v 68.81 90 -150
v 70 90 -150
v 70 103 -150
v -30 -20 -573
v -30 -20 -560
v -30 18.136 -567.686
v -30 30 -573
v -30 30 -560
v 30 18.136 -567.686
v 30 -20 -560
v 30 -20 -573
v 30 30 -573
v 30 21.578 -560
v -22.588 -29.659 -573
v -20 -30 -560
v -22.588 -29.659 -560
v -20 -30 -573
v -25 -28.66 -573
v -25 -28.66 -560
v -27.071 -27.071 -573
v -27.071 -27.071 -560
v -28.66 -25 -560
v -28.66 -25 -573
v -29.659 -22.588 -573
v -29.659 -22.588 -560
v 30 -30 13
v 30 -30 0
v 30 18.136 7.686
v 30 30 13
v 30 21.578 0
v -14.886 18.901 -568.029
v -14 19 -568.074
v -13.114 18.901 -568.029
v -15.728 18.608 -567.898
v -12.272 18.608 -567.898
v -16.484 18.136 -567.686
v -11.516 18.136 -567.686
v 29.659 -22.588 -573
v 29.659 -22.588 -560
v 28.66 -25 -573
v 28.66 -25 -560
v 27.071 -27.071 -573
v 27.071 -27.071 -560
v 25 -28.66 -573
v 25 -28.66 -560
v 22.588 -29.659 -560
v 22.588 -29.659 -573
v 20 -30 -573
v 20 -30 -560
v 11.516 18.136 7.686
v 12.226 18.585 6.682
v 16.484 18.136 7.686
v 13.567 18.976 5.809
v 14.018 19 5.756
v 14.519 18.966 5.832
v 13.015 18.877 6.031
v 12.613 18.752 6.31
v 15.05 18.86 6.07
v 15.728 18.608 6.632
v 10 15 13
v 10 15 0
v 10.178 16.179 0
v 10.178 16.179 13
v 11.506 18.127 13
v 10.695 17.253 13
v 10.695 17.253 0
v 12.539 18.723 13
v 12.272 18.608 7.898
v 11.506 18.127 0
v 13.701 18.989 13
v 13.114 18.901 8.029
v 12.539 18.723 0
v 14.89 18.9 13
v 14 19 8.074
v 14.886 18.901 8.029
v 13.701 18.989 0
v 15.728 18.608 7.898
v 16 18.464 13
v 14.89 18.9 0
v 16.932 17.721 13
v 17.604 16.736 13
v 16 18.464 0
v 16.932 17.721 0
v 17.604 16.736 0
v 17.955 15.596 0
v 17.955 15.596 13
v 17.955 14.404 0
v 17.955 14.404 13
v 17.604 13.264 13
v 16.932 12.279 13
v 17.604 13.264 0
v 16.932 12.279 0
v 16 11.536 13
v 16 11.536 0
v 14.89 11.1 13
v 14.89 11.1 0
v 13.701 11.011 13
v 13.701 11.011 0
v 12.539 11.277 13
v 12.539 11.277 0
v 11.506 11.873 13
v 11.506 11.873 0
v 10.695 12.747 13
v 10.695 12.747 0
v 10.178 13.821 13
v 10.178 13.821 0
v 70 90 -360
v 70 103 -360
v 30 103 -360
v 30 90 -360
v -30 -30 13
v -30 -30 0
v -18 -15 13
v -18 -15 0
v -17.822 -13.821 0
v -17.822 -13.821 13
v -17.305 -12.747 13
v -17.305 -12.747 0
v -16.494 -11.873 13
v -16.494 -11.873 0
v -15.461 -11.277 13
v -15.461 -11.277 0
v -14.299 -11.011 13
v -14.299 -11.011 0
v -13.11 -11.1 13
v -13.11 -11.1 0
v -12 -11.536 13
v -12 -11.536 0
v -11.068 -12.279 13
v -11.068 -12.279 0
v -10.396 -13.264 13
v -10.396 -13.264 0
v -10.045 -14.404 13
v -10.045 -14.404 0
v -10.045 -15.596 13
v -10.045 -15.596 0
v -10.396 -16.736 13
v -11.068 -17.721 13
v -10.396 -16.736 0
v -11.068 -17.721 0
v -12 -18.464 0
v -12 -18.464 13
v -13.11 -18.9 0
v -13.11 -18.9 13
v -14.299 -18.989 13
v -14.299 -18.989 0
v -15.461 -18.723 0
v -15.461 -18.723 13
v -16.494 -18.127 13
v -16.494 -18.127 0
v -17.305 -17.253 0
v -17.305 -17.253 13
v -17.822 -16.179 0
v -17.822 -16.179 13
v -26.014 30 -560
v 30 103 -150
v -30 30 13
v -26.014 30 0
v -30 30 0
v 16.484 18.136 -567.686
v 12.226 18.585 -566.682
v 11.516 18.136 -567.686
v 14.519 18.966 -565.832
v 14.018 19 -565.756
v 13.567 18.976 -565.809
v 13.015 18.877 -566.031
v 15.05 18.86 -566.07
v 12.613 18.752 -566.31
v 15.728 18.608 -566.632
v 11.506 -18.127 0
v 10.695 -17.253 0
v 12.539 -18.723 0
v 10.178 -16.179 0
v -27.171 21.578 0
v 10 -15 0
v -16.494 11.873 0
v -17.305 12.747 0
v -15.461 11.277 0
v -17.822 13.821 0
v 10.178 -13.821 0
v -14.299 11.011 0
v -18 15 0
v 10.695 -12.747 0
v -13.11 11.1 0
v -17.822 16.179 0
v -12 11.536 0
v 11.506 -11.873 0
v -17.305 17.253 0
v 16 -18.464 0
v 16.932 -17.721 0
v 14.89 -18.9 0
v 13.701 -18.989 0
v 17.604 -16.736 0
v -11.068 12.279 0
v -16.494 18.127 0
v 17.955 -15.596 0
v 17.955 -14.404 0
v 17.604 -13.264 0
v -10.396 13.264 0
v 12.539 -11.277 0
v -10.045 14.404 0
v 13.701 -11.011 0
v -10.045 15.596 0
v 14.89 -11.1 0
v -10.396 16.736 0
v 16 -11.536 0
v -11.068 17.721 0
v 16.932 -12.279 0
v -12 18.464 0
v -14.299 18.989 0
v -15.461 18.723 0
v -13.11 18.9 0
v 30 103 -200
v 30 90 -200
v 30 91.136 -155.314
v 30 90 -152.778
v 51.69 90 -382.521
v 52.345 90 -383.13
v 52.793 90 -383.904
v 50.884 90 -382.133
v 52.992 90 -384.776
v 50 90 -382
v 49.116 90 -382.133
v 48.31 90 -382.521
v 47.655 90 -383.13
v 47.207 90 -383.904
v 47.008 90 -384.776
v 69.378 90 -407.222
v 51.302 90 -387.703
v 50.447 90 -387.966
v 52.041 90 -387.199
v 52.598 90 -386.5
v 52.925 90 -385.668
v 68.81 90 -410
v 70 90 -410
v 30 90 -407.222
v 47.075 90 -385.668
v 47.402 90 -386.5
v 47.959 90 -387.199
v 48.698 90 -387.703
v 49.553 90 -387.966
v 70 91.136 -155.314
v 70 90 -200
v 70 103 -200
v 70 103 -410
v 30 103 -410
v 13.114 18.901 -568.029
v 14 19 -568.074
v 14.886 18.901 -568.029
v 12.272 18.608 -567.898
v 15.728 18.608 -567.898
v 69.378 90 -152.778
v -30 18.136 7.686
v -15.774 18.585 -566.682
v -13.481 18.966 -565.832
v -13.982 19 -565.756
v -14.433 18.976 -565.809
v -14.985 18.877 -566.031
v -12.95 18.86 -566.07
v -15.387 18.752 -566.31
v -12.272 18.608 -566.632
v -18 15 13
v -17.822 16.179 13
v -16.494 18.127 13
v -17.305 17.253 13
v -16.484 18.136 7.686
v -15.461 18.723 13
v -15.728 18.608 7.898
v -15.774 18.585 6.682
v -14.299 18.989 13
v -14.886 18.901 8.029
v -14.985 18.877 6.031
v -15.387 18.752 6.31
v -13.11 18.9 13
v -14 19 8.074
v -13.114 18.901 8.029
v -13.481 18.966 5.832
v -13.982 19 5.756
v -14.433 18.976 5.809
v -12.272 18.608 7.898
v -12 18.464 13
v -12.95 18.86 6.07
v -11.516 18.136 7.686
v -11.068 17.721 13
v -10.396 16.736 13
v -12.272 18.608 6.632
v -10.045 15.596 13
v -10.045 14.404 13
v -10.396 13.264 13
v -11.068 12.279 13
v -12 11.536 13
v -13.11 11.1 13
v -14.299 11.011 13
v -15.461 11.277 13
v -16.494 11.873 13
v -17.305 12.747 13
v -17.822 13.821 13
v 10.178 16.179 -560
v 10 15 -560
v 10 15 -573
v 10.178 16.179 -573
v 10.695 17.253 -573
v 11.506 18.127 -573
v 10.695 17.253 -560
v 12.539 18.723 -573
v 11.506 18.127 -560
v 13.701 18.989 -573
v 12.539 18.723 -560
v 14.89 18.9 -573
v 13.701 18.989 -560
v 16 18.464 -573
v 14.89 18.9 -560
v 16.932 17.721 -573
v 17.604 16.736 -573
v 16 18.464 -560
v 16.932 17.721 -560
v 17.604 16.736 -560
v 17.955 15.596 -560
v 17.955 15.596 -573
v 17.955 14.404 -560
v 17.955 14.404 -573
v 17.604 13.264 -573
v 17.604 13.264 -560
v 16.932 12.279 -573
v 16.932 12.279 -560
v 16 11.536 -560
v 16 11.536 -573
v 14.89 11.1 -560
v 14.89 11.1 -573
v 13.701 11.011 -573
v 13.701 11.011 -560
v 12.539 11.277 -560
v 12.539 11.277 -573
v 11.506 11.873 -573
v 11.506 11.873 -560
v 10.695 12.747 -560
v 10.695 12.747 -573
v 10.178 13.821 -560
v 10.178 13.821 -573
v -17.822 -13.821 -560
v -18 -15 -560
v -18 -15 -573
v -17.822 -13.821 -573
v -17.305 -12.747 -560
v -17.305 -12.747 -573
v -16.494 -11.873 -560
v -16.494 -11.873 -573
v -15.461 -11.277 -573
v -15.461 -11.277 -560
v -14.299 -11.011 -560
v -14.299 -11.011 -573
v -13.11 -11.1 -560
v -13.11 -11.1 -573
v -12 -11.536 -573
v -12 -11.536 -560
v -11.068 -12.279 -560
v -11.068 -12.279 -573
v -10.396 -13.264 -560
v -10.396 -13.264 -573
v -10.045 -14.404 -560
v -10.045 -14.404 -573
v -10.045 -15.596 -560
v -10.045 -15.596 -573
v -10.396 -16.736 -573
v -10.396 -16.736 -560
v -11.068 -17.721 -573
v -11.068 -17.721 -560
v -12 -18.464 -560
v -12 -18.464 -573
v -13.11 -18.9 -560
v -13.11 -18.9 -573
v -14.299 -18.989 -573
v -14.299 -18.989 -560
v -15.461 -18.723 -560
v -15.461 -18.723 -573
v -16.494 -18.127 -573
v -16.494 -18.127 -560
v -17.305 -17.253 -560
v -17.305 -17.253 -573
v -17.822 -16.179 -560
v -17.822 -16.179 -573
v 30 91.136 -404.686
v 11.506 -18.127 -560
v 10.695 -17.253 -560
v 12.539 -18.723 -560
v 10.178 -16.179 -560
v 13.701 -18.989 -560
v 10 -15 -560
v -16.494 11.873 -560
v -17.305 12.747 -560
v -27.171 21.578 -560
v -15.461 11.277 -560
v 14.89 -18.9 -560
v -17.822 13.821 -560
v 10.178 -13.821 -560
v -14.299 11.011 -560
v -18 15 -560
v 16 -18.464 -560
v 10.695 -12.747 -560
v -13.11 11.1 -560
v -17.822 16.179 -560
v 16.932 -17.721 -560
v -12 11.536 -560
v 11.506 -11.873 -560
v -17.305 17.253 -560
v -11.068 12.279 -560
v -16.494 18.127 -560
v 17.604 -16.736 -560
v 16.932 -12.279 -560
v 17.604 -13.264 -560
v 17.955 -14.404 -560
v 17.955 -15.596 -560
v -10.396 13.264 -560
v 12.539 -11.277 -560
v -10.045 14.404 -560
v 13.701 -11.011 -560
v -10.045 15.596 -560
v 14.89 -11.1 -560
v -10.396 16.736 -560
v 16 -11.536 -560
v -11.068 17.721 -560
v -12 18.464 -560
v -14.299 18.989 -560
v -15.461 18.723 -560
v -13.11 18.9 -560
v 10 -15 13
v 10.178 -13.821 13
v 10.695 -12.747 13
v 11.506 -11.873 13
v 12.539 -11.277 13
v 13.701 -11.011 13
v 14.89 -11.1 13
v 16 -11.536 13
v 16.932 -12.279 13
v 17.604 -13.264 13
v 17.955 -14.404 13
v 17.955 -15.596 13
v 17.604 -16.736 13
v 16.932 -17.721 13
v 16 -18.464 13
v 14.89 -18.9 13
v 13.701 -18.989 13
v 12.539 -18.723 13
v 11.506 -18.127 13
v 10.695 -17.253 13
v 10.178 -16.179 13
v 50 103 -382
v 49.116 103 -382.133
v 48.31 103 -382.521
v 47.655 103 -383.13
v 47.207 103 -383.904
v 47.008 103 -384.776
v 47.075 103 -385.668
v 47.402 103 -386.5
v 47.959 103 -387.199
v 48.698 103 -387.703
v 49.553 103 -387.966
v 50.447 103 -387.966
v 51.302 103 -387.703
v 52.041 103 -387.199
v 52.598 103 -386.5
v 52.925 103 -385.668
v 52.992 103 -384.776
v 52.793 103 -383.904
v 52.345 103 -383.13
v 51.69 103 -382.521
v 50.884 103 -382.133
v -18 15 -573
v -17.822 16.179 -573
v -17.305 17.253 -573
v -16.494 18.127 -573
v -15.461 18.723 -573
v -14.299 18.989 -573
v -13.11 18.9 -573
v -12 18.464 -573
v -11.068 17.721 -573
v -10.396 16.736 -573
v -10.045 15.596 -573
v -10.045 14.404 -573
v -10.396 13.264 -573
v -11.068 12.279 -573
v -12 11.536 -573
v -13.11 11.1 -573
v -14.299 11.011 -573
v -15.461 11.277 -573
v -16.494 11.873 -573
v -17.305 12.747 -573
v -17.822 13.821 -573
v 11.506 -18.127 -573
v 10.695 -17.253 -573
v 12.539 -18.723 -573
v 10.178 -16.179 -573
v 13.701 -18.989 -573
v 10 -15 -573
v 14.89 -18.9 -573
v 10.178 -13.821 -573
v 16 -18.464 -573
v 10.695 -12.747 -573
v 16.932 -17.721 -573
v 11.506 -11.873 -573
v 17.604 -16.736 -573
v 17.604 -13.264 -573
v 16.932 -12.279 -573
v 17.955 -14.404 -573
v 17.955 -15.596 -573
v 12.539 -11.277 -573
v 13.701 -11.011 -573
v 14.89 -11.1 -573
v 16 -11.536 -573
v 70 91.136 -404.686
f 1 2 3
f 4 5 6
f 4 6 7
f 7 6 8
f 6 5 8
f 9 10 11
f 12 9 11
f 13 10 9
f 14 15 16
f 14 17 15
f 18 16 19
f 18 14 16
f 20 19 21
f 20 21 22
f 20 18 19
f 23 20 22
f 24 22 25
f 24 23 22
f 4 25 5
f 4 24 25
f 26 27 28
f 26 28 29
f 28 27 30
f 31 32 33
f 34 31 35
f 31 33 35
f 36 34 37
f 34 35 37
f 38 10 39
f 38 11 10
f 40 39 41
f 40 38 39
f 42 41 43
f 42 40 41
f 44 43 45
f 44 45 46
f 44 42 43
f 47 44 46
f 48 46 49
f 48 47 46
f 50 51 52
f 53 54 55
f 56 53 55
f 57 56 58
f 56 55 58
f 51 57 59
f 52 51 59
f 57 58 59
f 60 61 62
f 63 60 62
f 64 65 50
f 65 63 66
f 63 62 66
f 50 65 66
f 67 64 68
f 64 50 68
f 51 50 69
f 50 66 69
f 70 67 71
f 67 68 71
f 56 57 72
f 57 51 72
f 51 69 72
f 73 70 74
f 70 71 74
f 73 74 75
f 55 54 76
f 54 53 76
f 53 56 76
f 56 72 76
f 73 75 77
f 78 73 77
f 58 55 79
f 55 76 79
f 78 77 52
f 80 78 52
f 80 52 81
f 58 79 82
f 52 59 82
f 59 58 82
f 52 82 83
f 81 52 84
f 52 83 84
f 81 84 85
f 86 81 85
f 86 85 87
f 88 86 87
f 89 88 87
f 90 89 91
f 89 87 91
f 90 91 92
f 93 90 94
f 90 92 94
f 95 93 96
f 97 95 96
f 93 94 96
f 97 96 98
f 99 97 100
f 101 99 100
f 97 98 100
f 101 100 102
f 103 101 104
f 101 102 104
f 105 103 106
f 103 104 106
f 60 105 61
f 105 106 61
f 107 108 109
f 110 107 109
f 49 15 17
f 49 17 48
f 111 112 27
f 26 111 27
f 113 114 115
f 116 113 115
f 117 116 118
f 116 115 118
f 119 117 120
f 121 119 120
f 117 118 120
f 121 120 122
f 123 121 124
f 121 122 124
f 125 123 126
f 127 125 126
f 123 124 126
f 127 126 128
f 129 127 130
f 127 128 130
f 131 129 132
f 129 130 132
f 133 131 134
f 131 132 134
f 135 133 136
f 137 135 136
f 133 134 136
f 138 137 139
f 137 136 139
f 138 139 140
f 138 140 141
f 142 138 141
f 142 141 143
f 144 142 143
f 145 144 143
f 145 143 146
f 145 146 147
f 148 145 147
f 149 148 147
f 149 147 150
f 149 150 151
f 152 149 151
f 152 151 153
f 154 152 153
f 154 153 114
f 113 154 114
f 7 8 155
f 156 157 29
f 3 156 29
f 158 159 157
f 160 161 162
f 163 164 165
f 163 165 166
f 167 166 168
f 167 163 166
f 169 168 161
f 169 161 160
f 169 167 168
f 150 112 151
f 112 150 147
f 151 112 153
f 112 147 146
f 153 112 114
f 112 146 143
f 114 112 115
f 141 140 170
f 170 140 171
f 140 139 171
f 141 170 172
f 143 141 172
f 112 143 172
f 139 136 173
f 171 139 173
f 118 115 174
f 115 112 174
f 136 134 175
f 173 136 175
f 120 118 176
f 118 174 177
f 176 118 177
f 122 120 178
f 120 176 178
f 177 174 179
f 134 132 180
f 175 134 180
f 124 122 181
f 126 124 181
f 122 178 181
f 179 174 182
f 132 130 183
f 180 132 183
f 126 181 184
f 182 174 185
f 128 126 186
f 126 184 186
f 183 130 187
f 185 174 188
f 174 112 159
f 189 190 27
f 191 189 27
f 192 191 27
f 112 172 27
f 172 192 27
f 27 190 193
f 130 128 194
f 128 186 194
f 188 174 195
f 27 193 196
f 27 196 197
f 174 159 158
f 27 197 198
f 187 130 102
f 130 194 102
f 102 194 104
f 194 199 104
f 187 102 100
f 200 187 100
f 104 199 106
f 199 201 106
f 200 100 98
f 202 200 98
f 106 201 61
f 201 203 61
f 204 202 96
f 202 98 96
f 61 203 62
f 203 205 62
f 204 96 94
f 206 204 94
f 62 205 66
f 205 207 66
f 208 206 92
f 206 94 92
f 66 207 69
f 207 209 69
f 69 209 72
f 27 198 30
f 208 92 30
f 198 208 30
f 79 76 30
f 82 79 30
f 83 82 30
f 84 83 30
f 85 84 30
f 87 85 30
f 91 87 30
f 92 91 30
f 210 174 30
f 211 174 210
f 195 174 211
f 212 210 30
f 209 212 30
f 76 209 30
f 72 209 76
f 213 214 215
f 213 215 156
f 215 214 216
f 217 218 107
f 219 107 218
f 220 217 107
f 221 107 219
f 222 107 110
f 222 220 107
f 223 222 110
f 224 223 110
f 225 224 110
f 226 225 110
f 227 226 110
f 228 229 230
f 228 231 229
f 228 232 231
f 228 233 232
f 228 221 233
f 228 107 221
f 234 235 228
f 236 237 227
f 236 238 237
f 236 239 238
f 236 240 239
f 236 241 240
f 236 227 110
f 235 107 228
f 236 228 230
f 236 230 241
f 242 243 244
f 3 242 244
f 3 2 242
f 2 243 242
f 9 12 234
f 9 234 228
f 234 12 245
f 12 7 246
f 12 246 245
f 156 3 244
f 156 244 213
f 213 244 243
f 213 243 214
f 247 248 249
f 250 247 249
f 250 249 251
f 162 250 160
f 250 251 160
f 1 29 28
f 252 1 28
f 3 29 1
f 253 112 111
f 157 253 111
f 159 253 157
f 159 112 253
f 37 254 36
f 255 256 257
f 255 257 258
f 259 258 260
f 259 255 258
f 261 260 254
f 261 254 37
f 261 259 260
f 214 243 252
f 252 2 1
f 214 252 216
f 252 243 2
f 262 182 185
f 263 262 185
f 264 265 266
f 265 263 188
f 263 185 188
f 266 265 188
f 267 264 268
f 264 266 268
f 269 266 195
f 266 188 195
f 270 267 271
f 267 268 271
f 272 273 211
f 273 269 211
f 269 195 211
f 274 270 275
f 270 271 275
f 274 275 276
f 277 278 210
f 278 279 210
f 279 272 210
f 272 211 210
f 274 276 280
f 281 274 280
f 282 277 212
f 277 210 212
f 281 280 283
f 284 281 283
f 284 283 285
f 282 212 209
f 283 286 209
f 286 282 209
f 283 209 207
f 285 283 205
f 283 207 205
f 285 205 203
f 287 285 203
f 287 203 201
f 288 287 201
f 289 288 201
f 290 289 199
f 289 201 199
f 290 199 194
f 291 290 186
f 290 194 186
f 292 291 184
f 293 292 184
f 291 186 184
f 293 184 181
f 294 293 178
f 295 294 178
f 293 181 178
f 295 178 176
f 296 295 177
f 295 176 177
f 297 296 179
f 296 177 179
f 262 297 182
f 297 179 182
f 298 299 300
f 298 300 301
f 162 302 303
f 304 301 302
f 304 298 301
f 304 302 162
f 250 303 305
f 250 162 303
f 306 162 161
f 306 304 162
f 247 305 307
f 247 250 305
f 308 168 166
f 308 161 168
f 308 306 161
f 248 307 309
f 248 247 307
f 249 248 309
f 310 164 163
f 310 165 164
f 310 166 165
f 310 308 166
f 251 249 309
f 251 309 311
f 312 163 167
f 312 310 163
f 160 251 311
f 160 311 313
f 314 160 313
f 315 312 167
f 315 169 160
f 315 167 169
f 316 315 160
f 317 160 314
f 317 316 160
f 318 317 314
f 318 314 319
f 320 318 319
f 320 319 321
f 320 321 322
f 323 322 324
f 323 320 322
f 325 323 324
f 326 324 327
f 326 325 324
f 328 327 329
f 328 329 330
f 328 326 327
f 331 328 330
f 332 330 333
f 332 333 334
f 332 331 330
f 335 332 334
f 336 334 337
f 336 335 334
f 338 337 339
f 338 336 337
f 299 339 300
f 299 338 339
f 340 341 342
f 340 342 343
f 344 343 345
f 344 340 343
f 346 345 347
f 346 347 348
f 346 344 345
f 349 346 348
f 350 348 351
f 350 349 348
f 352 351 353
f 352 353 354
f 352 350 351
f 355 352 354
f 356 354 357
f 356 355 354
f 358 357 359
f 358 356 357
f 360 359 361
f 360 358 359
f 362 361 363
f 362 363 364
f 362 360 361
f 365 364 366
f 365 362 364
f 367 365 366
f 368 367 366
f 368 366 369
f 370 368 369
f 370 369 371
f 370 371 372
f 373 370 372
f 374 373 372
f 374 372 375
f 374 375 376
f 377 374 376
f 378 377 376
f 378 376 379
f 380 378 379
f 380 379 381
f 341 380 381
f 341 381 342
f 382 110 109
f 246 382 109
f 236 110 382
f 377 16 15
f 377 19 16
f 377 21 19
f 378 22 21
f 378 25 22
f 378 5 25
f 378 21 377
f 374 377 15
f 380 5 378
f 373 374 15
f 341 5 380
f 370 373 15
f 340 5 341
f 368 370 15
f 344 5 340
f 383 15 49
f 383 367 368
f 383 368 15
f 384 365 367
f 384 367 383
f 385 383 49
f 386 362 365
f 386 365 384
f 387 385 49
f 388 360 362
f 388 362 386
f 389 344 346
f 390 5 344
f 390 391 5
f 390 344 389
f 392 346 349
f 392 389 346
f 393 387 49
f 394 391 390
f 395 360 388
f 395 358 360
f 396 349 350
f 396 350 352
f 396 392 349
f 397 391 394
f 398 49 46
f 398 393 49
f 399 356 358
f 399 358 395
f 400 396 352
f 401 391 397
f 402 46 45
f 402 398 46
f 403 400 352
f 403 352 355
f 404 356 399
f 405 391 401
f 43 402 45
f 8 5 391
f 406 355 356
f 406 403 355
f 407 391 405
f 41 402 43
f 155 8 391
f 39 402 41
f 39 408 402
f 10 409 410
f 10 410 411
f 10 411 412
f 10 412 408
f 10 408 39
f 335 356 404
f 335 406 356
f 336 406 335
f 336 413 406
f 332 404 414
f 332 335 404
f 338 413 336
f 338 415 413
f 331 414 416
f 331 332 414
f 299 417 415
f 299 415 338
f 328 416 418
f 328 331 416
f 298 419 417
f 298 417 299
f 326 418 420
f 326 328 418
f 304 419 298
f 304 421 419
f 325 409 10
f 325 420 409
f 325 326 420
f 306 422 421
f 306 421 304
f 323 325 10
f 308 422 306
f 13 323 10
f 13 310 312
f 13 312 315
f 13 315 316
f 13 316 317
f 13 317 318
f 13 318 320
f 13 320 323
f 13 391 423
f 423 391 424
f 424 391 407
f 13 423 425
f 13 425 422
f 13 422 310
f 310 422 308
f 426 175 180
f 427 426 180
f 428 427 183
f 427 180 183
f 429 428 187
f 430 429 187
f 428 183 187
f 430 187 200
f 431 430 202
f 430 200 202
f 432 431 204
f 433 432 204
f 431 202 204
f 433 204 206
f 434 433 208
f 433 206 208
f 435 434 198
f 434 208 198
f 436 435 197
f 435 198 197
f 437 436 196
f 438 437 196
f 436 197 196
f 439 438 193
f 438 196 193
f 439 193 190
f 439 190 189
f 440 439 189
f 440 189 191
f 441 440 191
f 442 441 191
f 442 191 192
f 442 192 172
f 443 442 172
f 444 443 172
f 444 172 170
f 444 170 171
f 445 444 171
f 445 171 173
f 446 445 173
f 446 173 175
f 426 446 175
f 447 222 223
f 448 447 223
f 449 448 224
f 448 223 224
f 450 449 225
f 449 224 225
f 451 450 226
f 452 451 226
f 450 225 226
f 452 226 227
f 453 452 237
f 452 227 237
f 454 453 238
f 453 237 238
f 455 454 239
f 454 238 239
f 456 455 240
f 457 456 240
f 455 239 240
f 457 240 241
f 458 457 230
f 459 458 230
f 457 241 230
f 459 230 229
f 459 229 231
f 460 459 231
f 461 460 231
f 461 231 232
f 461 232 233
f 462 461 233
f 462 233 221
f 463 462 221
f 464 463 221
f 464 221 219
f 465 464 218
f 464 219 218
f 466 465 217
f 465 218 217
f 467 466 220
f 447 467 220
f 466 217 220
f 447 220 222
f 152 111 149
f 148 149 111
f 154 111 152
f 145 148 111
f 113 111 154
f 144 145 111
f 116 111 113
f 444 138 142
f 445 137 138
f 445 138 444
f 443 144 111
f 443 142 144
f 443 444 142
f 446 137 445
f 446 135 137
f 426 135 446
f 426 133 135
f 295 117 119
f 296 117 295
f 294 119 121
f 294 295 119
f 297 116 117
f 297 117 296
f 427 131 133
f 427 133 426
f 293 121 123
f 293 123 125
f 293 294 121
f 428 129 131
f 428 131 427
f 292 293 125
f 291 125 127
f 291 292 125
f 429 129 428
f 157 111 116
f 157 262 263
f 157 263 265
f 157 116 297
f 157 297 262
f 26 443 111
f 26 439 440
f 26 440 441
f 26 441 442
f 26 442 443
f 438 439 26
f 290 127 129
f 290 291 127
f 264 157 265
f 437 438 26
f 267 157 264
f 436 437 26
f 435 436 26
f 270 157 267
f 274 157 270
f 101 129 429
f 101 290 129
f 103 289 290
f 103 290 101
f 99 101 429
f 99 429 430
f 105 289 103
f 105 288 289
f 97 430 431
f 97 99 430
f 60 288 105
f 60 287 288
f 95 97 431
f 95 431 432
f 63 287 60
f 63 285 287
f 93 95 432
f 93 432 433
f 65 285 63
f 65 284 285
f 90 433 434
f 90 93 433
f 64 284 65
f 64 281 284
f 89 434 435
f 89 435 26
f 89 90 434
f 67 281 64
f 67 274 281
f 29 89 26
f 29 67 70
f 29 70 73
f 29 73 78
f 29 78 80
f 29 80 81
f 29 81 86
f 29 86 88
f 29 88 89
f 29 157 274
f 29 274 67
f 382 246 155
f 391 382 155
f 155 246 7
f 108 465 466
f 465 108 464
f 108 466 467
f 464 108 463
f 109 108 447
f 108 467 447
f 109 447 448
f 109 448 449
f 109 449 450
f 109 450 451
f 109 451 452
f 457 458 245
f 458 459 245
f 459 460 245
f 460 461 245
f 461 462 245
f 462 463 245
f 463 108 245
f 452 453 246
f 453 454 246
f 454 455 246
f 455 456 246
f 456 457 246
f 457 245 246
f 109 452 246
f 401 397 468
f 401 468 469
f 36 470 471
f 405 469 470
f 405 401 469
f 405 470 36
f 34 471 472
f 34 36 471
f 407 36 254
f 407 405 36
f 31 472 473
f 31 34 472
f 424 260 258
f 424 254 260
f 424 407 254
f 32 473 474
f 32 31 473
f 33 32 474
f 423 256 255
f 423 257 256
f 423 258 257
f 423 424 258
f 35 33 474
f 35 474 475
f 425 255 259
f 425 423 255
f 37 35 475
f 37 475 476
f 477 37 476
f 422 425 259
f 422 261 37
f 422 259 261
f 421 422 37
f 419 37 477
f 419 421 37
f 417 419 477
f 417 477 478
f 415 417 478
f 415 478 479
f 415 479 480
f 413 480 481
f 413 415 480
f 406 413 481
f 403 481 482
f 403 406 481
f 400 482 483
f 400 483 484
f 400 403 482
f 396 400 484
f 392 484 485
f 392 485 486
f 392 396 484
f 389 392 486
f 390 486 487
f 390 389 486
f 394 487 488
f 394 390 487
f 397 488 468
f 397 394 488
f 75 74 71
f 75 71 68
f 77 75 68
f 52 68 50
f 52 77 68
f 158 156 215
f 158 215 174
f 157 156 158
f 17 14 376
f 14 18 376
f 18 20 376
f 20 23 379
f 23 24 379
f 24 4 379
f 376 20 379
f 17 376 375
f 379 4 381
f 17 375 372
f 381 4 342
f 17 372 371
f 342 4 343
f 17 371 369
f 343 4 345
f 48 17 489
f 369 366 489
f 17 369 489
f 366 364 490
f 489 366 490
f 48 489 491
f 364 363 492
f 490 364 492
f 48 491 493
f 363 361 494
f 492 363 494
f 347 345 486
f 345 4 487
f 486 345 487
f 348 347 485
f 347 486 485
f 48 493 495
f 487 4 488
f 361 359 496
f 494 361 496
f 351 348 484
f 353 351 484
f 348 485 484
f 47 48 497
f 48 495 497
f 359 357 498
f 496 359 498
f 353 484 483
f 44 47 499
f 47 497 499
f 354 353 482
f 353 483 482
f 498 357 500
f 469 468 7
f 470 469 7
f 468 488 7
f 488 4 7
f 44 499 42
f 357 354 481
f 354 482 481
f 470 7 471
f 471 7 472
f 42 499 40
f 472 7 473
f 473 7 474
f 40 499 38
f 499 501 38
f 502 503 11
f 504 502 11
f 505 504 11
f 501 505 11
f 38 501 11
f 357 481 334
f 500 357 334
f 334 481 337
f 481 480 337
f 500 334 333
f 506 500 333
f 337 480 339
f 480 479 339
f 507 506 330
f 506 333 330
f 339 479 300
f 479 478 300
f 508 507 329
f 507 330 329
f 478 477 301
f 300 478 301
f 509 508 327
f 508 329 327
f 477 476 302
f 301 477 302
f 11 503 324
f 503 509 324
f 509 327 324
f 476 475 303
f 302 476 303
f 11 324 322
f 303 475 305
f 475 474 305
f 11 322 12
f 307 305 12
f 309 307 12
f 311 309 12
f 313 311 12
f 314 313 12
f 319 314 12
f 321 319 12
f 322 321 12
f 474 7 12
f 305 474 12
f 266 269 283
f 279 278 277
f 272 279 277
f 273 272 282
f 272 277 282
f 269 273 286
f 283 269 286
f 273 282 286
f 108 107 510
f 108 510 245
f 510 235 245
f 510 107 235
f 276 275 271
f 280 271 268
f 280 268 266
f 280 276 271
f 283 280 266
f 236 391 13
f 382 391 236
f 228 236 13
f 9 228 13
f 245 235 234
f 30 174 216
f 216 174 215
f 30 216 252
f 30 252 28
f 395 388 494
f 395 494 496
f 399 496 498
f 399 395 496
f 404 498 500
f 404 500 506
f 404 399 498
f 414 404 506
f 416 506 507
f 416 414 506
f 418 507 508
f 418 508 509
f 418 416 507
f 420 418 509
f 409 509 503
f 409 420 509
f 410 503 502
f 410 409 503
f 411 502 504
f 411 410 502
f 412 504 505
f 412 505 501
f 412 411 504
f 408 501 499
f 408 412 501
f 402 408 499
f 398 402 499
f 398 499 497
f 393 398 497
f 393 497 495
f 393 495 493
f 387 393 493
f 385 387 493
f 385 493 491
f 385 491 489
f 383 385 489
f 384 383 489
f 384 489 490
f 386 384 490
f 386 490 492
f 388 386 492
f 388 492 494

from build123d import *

# Parameters (mm, degrees)
SZKIC1_W                    = 60
SZKIC1_H                    = 60
DODANIE_WYCI_GNI_CIE1_DEPTH = 13
OTWORY_USTALAJ_CE_8_0MM1_D  = 8
DODANIE_WYCI_GNI_CIE3_DEPTH = 13
SZKIC5_7_W                  = 40
SZKIC5_7_H                  = 13
DODANIE_WYCI_GNI_CIE6_DEPTH = 50
ZAOKR_GLENIE3_R             = 10
ZAOKR_GLENIE4_R             = 10
SZKIC9_W                    = 3
SZKIC9_H                    = 133


with BuildPart() as part:
    # Szkic1 → Dodanie-wyciągnięcie1 (new body)
    with BuildSketch(Plane.XY):
        Rectangle(SZKIC1_W, SZKIC1_H)
    extrude(amount=DODANIE_WYCI_GNI_CIE1_DEPTH)

    # Otwory ustalające Ø8.0mm1 (through all)
    with Locations(Plane.XY.offset(13)):
        with Locations((14, 15), (-14, 15), (-14, -15), (14, -15)):
            Hole(OTWORY_USTALAJ_CE_8_0MM1_D / 2)

    # Szkic7 → Dodanie-wyciągnięcie3 (add)
    with BuildSketch(Plane(origin=(0, 29.837513324, 13.362812716), x_dir=(1, 0, 0), z_dir=(0, 0.9126534031310359, 0.40873434618751925))):
        Polygon((30, 0.397536145), (70, 178.997648127), (30, 178.997648127), (-30, 0.397536145), align=None)
    extrude(amount=-DODANIE_WYCI_GNI_CIE3_DEPTH)

    # Szkic5<7> → Dodanie-wyciągnięcie6 (add)
    with BuildSketch(Plane(origin=(0, 0, -150), x_dir=(-1, 0, 0), z_dir=(0, 0, -1))):
        with Locations((-50, 96.5)):
            Rectangle(SZKIC5_7_W, SZKIC5_7_H)
    extrude(amount=DODANIE_WYCI_GNI_CIE6_DEPTH)


with BuildPart() as body_2:
    # Lustro3: mirrored copy
    add(part.part.mirror(Plane(origin=(0, 0, -280), x_dir=(1, 0, 0), z_dir=(0, 0, -1))))

    # Zaokrąglenie3
    zaokr_glenie3_edges = [body_2.edges().sort_by_distance(p)[0] for p in [
        (30, -30, -566.5),
    ]]
    fillet(zaokr_glenie3_edges, radius=ZAOKR_GLENIE3_R)

    # Zaokrąglenie4
    zaokr_glenie4_edges = [body_2.edges().sort_by_distance(p)[0] for p in [
        (-30, -30, -566.5),
    ]]
    fillet(zaokr_glenie4_edges, radius=ZAOKR_GLENIE4_R)

    # Szkic9 → Otwory ustalające Ø6.0mm1 (revolve, cut)
    with BuildSketch(Plane(origin=(50, 103, -385), x_dir=(0, 0, 1), z_dir=(1, 0, 0))):
        with Locations((1.5, 66.5)):
            Rectangle(SZKIC9_W, SZKIC9_H)
    revolve(axis=Axis((50, 109.35, -385), (0, -1, 0)), mode=Mode.SUBTRACT)


solid = Compound([part.part, body_2.part])
